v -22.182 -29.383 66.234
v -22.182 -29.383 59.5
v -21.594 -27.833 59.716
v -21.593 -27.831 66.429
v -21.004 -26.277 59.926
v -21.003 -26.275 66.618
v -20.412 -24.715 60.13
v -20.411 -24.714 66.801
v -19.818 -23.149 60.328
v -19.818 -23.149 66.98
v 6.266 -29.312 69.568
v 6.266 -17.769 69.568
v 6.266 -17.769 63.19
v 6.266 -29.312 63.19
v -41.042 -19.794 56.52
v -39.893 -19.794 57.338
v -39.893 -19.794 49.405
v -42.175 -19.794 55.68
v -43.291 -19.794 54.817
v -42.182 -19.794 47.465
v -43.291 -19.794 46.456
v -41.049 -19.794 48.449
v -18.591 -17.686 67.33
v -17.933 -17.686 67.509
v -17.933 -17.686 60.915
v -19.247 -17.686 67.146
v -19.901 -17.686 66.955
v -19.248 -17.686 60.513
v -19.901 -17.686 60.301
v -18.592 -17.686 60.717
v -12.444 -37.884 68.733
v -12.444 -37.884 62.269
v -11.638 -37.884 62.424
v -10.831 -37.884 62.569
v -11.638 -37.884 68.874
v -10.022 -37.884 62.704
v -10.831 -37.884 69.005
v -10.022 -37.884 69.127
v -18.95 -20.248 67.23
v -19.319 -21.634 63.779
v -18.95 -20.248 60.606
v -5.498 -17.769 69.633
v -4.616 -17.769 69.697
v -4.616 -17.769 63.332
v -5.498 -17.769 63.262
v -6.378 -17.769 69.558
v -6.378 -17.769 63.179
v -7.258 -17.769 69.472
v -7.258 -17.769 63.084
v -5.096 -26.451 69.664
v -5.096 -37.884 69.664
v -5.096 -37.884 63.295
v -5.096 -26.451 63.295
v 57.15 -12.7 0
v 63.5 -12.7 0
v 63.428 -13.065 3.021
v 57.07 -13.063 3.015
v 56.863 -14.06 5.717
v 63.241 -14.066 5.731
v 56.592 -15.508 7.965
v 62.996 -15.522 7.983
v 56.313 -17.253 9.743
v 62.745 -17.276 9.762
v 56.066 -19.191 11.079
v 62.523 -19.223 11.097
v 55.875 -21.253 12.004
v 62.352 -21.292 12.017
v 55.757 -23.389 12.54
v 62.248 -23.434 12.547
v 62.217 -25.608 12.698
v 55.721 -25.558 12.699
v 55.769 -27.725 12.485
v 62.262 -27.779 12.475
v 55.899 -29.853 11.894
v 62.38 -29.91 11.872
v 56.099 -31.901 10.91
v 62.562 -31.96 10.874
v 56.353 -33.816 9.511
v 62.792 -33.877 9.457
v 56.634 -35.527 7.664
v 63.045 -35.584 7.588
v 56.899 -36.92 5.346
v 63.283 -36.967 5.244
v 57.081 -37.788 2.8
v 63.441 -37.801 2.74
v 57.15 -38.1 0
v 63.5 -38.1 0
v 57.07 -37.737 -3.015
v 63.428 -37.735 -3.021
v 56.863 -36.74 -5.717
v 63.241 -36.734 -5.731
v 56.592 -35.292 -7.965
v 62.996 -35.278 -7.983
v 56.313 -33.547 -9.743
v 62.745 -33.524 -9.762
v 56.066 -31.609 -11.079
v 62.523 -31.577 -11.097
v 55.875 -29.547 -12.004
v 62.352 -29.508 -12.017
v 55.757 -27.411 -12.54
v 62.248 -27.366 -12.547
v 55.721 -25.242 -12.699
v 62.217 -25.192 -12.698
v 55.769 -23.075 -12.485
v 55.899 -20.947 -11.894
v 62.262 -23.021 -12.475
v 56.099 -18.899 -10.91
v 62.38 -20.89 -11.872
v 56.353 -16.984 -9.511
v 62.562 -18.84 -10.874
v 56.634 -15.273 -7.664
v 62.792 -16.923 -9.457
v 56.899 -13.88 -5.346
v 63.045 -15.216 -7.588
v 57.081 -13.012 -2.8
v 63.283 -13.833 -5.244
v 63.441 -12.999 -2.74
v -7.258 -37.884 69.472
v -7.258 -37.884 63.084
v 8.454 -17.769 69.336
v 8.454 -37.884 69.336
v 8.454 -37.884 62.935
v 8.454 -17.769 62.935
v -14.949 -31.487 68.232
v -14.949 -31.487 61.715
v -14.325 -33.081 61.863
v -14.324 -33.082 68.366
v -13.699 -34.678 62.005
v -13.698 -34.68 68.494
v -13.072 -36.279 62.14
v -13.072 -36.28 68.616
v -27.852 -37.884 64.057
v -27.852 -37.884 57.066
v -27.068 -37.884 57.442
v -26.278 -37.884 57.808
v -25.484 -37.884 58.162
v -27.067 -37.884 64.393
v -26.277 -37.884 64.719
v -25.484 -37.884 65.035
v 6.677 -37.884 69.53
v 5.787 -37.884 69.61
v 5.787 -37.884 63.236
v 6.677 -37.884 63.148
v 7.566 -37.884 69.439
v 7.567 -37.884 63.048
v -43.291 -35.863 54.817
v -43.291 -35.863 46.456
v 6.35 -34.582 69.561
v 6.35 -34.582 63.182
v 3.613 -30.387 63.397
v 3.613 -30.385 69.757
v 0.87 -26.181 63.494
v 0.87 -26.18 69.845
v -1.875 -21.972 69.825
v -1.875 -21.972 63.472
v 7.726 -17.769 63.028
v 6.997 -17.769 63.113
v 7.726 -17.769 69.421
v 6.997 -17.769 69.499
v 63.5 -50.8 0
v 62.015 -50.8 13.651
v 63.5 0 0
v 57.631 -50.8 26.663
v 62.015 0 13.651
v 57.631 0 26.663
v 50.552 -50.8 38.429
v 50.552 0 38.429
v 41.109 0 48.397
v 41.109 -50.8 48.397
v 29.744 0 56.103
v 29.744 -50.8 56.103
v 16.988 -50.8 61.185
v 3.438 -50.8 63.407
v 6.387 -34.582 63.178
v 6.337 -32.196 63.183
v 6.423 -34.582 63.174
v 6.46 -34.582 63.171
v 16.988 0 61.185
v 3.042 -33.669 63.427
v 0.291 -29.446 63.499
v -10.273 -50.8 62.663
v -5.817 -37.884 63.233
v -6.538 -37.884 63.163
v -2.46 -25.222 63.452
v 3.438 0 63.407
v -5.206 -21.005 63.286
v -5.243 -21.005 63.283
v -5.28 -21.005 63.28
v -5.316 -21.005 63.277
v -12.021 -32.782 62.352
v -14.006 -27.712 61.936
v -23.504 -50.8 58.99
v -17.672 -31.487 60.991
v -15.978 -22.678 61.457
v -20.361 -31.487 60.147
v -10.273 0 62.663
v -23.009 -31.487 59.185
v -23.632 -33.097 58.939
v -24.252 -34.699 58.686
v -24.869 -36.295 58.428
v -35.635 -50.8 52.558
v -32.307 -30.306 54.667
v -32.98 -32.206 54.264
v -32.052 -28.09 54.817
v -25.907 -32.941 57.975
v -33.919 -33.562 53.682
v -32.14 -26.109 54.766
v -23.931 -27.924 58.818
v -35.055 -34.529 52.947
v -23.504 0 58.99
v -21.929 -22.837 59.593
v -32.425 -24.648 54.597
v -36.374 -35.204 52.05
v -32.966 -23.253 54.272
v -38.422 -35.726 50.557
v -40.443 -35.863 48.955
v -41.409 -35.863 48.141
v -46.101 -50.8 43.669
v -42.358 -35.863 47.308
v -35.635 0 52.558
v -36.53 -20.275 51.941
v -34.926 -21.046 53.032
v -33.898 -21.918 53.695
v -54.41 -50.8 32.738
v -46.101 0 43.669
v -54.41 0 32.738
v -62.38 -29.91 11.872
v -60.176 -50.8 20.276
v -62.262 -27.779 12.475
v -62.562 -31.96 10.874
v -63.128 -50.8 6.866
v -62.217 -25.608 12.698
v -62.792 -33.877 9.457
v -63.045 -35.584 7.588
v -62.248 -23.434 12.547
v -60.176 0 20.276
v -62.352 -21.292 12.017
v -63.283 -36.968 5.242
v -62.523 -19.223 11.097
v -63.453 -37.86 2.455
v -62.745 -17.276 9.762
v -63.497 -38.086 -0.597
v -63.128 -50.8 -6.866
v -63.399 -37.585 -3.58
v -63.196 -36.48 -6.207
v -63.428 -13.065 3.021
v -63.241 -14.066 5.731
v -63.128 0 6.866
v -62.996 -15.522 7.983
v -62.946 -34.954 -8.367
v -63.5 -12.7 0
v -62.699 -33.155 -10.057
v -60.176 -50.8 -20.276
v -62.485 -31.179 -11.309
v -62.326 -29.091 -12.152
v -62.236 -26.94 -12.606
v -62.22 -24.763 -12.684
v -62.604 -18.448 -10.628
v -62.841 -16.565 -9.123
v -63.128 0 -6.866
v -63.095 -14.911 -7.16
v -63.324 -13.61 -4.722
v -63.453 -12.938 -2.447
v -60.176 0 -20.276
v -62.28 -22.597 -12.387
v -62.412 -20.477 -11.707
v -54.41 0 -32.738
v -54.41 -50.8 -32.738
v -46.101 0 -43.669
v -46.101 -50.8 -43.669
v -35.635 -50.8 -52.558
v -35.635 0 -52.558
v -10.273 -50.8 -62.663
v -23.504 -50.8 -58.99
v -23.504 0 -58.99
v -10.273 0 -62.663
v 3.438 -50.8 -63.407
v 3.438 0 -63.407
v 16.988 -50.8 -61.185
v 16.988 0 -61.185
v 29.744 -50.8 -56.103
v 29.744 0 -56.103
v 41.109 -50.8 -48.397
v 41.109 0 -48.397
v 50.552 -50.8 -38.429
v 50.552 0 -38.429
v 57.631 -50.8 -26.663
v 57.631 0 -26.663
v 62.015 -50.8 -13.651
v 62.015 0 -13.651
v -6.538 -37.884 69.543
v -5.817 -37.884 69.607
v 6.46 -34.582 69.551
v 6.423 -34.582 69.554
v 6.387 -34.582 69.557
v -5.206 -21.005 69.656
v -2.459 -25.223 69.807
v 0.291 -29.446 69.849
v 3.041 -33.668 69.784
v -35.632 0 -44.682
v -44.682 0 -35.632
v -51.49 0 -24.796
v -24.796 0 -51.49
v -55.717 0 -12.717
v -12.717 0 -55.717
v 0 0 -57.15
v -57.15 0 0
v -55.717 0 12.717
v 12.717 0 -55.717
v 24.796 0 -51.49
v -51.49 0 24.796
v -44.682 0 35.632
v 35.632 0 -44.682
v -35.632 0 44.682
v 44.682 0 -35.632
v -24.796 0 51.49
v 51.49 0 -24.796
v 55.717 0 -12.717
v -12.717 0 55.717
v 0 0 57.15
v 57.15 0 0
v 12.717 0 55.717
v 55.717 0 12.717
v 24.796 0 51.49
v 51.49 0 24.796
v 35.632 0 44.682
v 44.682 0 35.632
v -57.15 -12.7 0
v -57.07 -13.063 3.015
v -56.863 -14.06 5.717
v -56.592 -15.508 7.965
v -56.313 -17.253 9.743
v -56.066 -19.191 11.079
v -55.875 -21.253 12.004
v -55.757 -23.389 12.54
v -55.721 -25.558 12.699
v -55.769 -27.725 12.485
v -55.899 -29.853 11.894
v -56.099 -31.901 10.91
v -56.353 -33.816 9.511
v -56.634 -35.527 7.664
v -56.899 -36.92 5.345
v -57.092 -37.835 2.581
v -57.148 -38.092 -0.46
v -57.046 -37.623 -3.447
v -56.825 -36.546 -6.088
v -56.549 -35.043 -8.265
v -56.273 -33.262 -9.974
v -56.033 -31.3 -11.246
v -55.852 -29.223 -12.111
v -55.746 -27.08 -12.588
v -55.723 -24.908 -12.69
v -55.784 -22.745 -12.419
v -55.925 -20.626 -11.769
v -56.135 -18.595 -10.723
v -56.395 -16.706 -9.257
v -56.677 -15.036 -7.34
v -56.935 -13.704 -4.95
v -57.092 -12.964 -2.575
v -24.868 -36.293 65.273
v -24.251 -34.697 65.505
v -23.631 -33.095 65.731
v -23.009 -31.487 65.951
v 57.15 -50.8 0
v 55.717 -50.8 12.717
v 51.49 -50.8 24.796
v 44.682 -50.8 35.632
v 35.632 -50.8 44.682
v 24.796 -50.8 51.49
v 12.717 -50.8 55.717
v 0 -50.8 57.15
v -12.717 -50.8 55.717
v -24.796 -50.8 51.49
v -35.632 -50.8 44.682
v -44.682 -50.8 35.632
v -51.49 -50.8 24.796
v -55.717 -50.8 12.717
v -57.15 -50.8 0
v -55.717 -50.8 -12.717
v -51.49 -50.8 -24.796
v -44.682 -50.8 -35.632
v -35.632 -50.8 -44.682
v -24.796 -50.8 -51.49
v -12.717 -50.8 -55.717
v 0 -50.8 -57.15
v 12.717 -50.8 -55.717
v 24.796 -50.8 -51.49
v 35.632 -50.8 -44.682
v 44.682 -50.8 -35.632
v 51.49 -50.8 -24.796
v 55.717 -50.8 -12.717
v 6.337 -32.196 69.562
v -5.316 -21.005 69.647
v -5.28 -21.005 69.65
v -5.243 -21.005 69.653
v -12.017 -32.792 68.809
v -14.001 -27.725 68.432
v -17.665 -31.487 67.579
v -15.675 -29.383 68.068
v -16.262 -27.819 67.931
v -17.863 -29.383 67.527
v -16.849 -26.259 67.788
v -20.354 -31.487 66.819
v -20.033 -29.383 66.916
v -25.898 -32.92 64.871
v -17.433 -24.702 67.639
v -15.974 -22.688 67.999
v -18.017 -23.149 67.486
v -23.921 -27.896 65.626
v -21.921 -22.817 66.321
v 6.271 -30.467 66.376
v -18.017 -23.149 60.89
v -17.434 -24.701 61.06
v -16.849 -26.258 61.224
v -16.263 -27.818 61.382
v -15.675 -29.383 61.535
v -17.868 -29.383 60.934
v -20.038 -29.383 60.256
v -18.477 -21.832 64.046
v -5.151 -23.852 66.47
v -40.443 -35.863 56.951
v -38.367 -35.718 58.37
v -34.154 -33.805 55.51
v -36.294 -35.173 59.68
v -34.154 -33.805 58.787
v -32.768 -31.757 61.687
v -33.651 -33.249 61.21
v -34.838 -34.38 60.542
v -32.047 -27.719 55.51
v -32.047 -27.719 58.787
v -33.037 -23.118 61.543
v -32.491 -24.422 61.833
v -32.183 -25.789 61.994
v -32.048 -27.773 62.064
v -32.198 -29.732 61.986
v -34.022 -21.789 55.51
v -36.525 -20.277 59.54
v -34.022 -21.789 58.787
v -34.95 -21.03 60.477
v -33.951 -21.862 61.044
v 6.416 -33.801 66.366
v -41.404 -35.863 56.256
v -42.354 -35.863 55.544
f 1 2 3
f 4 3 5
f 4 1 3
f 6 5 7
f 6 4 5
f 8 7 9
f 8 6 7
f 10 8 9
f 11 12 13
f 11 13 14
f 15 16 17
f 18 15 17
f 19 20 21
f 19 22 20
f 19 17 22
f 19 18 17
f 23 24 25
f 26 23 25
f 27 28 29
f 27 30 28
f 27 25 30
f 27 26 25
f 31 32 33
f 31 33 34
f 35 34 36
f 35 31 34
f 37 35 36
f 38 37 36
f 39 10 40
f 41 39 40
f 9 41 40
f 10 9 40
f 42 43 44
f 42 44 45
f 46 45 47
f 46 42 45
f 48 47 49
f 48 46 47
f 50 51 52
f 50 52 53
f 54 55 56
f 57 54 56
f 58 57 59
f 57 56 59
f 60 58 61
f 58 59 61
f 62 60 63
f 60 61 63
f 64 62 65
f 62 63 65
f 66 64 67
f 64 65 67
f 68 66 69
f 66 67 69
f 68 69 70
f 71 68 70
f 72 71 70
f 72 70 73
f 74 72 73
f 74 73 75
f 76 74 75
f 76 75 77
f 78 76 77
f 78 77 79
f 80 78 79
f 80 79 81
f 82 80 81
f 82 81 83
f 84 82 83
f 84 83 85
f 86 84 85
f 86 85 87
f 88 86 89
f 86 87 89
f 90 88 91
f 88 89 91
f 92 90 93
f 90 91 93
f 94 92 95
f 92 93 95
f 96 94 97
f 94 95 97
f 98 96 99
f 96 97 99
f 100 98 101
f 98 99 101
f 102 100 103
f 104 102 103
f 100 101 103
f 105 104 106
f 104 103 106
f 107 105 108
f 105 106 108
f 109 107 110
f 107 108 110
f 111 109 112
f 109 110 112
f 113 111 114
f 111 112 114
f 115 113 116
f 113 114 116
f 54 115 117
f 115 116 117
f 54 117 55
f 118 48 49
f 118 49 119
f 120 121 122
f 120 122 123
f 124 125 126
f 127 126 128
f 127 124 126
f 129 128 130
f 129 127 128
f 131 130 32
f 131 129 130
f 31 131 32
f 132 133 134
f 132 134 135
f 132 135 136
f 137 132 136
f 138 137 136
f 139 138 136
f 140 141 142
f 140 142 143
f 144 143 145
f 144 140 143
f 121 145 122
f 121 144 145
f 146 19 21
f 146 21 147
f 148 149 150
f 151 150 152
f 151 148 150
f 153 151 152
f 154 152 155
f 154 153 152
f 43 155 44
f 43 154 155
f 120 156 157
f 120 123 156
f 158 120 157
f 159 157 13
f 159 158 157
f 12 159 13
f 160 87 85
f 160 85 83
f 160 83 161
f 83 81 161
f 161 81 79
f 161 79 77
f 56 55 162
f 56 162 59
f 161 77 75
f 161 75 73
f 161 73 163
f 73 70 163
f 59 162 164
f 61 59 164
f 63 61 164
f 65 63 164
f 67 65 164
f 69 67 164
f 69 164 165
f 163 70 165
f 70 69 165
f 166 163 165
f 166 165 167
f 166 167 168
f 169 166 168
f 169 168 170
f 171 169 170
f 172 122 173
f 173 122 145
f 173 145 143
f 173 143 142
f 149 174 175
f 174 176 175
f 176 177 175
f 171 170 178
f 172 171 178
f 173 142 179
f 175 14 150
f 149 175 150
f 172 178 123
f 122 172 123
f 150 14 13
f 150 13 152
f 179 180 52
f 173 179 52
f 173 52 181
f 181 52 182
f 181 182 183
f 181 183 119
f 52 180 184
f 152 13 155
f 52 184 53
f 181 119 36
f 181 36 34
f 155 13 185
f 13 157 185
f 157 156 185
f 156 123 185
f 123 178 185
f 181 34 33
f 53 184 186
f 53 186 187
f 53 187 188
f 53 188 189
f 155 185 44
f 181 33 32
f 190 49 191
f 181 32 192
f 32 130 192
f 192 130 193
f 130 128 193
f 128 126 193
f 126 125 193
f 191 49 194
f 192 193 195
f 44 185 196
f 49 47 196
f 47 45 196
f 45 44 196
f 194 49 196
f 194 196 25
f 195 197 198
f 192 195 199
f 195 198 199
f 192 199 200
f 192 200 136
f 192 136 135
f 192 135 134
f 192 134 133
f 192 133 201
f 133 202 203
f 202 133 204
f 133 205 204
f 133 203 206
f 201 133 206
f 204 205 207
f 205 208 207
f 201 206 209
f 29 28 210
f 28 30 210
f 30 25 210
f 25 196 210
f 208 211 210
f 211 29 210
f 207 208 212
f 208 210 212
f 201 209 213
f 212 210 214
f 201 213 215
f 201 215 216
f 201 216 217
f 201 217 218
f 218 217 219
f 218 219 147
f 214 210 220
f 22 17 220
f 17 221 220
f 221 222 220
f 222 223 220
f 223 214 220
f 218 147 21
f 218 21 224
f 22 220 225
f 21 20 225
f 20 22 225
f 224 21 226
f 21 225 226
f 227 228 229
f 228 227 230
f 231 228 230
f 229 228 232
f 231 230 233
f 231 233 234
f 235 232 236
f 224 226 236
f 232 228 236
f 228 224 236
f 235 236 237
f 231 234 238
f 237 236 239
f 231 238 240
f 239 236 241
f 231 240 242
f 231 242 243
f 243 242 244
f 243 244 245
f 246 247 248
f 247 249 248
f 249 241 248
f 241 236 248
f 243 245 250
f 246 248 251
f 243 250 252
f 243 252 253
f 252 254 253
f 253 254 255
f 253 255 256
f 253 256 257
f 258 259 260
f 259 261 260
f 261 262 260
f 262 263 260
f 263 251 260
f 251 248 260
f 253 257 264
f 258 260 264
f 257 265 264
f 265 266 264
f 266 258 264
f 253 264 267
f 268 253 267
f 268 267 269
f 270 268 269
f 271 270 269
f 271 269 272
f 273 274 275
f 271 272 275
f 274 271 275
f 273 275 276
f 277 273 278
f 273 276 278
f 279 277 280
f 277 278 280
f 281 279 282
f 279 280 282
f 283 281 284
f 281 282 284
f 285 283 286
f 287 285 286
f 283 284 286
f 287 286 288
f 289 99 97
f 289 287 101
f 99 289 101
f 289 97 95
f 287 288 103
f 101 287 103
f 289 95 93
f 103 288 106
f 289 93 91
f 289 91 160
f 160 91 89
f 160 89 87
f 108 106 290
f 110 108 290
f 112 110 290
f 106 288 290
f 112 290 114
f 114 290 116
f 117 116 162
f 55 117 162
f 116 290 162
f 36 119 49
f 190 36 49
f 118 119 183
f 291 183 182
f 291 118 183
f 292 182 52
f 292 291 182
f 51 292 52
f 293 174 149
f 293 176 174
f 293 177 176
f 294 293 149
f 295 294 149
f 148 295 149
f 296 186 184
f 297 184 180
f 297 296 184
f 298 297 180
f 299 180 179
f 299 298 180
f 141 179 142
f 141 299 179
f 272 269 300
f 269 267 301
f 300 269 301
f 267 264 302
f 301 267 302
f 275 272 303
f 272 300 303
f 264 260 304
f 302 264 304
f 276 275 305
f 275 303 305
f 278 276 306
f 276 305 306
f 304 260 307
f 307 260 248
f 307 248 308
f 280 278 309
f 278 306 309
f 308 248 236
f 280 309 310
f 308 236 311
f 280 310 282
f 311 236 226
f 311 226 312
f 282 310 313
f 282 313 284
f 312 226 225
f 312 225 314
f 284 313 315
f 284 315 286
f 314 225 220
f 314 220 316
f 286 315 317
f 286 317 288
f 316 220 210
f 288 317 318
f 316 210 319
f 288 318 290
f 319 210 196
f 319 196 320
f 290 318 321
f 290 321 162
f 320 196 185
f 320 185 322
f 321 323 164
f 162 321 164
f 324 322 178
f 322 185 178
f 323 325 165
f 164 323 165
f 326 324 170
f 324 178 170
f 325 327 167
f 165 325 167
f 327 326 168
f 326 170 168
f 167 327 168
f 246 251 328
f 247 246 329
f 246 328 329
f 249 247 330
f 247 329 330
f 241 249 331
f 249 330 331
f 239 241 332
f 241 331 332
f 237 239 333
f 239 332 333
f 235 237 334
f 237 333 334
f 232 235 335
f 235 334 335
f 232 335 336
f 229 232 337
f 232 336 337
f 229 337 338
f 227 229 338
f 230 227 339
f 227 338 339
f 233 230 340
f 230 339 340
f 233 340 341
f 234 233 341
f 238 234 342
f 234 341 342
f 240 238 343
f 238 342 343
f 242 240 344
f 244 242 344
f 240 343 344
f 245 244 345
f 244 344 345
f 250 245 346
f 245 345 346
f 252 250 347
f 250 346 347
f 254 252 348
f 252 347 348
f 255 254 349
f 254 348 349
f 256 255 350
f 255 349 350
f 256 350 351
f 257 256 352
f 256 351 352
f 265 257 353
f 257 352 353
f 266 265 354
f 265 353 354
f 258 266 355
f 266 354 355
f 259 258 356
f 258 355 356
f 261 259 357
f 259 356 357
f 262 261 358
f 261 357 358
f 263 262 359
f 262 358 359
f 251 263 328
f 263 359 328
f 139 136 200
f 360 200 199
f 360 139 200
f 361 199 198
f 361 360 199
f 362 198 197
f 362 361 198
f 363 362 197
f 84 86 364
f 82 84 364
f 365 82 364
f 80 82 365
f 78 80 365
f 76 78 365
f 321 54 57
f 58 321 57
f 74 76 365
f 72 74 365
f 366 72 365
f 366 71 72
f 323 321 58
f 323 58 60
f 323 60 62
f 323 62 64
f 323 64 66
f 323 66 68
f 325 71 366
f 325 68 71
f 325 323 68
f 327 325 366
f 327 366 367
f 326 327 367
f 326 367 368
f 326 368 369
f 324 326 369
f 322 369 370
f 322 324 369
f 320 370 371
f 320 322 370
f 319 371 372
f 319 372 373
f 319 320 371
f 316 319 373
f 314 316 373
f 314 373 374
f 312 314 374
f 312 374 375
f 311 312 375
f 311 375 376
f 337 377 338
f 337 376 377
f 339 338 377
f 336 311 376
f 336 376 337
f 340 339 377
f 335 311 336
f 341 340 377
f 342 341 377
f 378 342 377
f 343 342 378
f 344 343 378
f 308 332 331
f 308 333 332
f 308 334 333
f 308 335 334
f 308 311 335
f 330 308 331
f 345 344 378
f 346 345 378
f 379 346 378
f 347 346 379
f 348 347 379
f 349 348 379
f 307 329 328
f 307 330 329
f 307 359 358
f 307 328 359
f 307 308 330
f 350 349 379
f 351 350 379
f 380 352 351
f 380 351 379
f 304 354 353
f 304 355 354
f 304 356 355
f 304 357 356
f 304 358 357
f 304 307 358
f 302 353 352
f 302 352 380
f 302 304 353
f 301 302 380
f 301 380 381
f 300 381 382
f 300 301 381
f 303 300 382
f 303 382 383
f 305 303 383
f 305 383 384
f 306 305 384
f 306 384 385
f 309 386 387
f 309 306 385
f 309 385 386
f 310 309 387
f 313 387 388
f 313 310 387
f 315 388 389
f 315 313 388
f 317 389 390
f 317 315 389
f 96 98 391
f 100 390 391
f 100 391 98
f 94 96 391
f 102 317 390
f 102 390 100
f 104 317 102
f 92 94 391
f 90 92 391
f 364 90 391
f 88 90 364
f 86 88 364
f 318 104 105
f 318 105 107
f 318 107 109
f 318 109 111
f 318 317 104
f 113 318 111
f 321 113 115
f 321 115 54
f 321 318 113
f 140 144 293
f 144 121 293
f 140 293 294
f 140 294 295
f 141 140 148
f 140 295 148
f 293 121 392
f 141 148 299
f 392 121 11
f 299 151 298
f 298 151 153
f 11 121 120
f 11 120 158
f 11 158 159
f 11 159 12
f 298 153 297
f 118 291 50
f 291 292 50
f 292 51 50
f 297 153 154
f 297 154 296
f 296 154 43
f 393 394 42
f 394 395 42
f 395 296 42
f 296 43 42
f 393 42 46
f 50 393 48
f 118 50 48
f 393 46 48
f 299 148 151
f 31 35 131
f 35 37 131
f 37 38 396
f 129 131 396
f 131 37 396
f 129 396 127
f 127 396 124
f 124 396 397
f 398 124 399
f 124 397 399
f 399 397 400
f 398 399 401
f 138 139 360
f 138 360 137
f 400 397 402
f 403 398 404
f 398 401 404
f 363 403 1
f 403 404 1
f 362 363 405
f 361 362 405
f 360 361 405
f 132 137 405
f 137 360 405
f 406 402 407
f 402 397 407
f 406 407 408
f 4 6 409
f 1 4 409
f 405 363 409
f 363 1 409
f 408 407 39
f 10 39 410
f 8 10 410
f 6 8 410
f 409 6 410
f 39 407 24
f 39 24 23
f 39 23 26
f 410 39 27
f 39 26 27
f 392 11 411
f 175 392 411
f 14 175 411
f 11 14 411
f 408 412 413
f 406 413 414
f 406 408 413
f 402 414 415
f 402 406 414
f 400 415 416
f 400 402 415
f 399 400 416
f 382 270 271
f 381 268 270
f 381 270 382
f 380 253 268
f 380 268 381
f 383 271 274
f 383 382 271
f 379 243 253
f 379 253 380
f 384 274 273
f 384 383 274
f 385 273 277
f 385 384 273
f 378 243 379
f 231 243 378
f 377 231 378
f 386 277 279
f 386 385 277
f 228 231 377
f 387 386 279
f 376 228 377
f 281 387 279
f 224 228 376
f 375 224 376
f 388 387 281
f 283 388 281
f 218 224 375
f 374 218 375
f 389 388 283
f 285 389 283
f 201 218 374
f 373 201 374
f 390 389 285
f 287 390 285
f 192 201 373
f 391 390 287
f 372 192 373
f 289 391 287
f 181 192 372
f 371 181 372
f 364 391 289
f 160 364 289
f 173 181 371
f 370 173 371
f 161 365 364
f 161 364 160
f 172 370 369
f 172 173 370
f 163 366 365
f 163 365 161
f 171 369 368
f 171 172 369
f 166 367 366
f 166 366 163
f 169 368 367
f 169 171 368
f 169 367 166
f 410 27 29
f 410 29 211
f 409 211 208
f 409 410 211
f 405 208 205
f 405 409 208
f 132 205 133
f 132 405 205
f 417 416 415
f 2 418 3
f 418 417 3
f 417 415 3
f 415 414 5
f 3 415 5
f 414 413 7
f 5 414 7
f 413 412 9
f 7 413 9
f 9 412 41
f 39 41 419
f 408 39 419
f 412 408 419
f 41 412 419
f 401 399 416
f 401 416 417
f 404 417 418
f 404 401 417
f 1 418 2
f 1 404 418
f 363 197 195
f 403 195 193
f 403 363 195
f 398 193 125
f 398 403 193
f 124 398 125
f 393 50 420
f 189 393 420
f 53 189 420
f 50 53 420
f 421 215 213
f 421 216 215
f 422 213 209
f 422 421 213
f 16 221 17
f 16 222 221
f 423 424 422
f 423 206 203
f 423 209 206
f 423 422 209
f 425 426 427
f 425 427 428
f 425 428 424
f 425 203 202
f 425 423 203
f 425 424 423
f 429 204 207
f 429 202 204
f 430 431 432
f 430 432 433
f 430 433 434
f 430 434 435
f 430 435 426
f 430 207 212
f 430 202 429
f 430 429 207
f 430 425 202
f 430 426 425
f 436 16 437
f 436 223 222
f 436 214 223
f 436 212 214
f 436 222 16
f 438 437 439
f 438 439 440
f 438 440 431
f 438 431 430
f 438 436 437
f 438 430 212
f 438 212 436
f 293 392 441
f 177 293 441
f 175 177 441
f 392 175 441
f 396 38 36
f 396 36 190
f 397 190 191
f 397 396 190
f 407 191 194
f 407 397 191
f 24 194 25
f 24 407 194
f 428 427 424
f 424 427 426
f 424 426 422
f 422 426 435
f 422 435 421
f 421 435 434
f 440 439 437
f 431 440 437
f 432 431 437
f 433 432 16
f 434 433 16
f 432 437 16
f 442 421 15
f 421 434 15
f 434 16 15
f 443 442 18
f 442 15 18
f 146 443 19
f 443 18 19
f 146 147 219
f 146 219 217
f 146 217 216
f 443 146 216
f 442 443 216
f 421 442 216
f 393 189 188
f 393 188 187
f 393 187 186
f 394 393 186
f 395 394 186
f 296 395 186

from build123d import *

# Parameters (mm, degrees)
F0_R     = 63.5
F0_R_2   = 57.15
F1_DEPTH = 50.8
F4_R     = 117.5833254056
F4_R_2   = 69.85
F5_DEPTH = 76.2
F7_R     = 12.7
F8_DEPTH = 76.2


with BuildPart() as f1:
    # F0 (on Front) → F1 (new body)
    with BuildSketch(Plane.XZ):
        Circle(F0_R)
        Circle(F0_R_2, mode=Mode.SUBTRACT)
    extrude(amount=F1_DEPTH)

    # F2 (on offset) → F3 (join, up to the next surface of F1)
    with BuildSketch(Plane.XY.offset(76.2)):
        with BuildLine():
            Line((5.7865704067, -37.8838032484), (8.454411462, -37.8838032484))
            Line((8.454411462, -37.8838032484), (8.454411462, -17.7693382623))
            Line((8.454411462, -17.7693382623), (6.2664296064, -17.7693382623))
            Line((6.2664296064, -17.7693382623), (6.2664296064, -29.3123733233))
            add(Edge.make_bspline(
                [(6.3368676541, -32.1959308995), (6.2400153385, -30.1796417852), (6.2664296064, -29.3123733233)],
                knots=[0, 0, 0, 1, 1, 1], degree=2))
            add(Edge.make_bspline(
                [(6.4601342375, -34.5820197642), (6.4337199696, -34.2122200139), (6.3368676541, -32.1959308995)],
                knots=[0, 0, 0, 1, 1, 1], degree=2))
            Line((6.4601342375, -34.5820197642), (6.350074788, -34.5820197642))
            Line((6.350074788, -34.5820197642), (-4.6162487577, -17.7693382623))
            Line((-4.6162487577, -17.7693382623), (-7.2576755451, -17.7693382623))
            Line((-7.2576755451, -17.7693382623), (-7.2576755451, -37.8838032484))
            Line((-7.2576755451, -37.8838032484), (-5.0961079574, -37.8838032484))
            Line((-5.0961079574, -37.8838032484), (-5.0961079574, -26.4508276369))
            add(Edge.make_bspline(
                [(-5.3162268563, -21.0050860769), (-5.0961079574, -23.9766912127), (-5.0961079574, -26.4508276369)],
                knots=[0, 0, 0, 1, 1, 1], degree=2))
            Line((-5.3162268563, -21.0050860769), (-5.2061674069, -21.0050860769))
            Line((-5.2061674069, -21.0050860769), (5.7865704067, -37.8838032484))
        make_face()
        Polygon((-14.9486298744, -31.4871480449), (-12.4436768043, -37.8838032484), (-10.0223689159, -37.8838032484), (-17.9334421442, -17.6856930807), (-19.9013051008, -17.6856930807), (-27.8519997309, -37.8838032484), (-25.4835203782, -37.8838032484), (-23.009383954, -31.4871480449), align=None)
        with BuildLine():
            Line((-18.0170873258, -23.1490441527), (-15.6750222409, -29.382811371))
            Line((-15.6750222409, -29.382811371), (-22.1817368939, -29.382811371))
            Line((-22.1817368939, -29.382811371), (-19.8176599192, -23.1490441527))
            add(Edge.make_bspline(
                [(-18.9503914573, -20.2478770645), (-19.2541555379, -21.5685904582), (-19.8176599192, -23.1490441527)],
                knots=[0, 0, 0, 1, 1, 1], degree=2))
            add(Edge.make_bspline(
                [(-18.0170873258, -23.1490441527), (-18.4705322576, -21.9648044763), (-18.9503914573, -20.2478770645)],
                knots=[0, 0, 0, 1, 1, 1], degree=2))
        make_face(mode=Mode.SUBTRACT)
        with BuildLine():
            add(Edge.make_bspline(
                [(-34.1540038078, -33.8050000509), (-32.0474659448, -31.7468883457), (-32.0474659448, -27.7187124949)],
                knots=[0, 0, 0, 1, 1, 1], degree=2))
            add(Edge.make_bspline(
                [(-32.0474659448, -27.7187124949), (-32.0474659448, -23.7829865817), (-34.0219324684, -21.7887093572)],
                knots=[0, 0, 0, 1, 1, 1], degree=2))
            add(Edge.make_bspline(
                [(-34.0219324684, -21.7887093572), (-35.996398992, -19.7944321327), (-39.8925035034, -19.7944321327)],
                knots=[0, 0, 0, 1, 1, 1], degree=2))
            Line((-39.8925035034, -19.7944321327), (-43.2911393032, -19.7944321327))
            Line((-43.2911393032, -19.7944321327), (-43.2911393032, -35.863111756))
            Line((-43.2911393032, -35.863111756), (-40.4428007508, -35.863111756))
            add(Edge.make_bspline(
                [(-40.4428007508, -35.863111756), (-36.2605416707, -35.863111756), (-34.1540038078, -33.8050000509)],
                knots=[0, 0, 0, 1, 1, 1], degree=2))
        make_face()
    extrude(until=Until.NEXT, dir=(0, 0, -1))

    # F4 (on Front) → F5 (cut, symmetric)
    with BuildSketch(Plane.XZ):
        with Locations((3.9105862379, 0.7332265377)):
            Circle(F4_R)
        Circle(F4_R_2, mode=Mode.SUBTRACT)
    extrude(amount=F5_DEPTH, both=True, mode=Mode.SUBTRACT)

    # F7 (on Right) → F8 (cut, symmetric)
    with BuildSketch(Plane.YZ):
        with Locations((-25.4, 0)):
            Circle(F7_R)
    extrude(amount=F8_DEPTH, both=True, mode=Mode.SUBTRACT)


solid = f1.part
